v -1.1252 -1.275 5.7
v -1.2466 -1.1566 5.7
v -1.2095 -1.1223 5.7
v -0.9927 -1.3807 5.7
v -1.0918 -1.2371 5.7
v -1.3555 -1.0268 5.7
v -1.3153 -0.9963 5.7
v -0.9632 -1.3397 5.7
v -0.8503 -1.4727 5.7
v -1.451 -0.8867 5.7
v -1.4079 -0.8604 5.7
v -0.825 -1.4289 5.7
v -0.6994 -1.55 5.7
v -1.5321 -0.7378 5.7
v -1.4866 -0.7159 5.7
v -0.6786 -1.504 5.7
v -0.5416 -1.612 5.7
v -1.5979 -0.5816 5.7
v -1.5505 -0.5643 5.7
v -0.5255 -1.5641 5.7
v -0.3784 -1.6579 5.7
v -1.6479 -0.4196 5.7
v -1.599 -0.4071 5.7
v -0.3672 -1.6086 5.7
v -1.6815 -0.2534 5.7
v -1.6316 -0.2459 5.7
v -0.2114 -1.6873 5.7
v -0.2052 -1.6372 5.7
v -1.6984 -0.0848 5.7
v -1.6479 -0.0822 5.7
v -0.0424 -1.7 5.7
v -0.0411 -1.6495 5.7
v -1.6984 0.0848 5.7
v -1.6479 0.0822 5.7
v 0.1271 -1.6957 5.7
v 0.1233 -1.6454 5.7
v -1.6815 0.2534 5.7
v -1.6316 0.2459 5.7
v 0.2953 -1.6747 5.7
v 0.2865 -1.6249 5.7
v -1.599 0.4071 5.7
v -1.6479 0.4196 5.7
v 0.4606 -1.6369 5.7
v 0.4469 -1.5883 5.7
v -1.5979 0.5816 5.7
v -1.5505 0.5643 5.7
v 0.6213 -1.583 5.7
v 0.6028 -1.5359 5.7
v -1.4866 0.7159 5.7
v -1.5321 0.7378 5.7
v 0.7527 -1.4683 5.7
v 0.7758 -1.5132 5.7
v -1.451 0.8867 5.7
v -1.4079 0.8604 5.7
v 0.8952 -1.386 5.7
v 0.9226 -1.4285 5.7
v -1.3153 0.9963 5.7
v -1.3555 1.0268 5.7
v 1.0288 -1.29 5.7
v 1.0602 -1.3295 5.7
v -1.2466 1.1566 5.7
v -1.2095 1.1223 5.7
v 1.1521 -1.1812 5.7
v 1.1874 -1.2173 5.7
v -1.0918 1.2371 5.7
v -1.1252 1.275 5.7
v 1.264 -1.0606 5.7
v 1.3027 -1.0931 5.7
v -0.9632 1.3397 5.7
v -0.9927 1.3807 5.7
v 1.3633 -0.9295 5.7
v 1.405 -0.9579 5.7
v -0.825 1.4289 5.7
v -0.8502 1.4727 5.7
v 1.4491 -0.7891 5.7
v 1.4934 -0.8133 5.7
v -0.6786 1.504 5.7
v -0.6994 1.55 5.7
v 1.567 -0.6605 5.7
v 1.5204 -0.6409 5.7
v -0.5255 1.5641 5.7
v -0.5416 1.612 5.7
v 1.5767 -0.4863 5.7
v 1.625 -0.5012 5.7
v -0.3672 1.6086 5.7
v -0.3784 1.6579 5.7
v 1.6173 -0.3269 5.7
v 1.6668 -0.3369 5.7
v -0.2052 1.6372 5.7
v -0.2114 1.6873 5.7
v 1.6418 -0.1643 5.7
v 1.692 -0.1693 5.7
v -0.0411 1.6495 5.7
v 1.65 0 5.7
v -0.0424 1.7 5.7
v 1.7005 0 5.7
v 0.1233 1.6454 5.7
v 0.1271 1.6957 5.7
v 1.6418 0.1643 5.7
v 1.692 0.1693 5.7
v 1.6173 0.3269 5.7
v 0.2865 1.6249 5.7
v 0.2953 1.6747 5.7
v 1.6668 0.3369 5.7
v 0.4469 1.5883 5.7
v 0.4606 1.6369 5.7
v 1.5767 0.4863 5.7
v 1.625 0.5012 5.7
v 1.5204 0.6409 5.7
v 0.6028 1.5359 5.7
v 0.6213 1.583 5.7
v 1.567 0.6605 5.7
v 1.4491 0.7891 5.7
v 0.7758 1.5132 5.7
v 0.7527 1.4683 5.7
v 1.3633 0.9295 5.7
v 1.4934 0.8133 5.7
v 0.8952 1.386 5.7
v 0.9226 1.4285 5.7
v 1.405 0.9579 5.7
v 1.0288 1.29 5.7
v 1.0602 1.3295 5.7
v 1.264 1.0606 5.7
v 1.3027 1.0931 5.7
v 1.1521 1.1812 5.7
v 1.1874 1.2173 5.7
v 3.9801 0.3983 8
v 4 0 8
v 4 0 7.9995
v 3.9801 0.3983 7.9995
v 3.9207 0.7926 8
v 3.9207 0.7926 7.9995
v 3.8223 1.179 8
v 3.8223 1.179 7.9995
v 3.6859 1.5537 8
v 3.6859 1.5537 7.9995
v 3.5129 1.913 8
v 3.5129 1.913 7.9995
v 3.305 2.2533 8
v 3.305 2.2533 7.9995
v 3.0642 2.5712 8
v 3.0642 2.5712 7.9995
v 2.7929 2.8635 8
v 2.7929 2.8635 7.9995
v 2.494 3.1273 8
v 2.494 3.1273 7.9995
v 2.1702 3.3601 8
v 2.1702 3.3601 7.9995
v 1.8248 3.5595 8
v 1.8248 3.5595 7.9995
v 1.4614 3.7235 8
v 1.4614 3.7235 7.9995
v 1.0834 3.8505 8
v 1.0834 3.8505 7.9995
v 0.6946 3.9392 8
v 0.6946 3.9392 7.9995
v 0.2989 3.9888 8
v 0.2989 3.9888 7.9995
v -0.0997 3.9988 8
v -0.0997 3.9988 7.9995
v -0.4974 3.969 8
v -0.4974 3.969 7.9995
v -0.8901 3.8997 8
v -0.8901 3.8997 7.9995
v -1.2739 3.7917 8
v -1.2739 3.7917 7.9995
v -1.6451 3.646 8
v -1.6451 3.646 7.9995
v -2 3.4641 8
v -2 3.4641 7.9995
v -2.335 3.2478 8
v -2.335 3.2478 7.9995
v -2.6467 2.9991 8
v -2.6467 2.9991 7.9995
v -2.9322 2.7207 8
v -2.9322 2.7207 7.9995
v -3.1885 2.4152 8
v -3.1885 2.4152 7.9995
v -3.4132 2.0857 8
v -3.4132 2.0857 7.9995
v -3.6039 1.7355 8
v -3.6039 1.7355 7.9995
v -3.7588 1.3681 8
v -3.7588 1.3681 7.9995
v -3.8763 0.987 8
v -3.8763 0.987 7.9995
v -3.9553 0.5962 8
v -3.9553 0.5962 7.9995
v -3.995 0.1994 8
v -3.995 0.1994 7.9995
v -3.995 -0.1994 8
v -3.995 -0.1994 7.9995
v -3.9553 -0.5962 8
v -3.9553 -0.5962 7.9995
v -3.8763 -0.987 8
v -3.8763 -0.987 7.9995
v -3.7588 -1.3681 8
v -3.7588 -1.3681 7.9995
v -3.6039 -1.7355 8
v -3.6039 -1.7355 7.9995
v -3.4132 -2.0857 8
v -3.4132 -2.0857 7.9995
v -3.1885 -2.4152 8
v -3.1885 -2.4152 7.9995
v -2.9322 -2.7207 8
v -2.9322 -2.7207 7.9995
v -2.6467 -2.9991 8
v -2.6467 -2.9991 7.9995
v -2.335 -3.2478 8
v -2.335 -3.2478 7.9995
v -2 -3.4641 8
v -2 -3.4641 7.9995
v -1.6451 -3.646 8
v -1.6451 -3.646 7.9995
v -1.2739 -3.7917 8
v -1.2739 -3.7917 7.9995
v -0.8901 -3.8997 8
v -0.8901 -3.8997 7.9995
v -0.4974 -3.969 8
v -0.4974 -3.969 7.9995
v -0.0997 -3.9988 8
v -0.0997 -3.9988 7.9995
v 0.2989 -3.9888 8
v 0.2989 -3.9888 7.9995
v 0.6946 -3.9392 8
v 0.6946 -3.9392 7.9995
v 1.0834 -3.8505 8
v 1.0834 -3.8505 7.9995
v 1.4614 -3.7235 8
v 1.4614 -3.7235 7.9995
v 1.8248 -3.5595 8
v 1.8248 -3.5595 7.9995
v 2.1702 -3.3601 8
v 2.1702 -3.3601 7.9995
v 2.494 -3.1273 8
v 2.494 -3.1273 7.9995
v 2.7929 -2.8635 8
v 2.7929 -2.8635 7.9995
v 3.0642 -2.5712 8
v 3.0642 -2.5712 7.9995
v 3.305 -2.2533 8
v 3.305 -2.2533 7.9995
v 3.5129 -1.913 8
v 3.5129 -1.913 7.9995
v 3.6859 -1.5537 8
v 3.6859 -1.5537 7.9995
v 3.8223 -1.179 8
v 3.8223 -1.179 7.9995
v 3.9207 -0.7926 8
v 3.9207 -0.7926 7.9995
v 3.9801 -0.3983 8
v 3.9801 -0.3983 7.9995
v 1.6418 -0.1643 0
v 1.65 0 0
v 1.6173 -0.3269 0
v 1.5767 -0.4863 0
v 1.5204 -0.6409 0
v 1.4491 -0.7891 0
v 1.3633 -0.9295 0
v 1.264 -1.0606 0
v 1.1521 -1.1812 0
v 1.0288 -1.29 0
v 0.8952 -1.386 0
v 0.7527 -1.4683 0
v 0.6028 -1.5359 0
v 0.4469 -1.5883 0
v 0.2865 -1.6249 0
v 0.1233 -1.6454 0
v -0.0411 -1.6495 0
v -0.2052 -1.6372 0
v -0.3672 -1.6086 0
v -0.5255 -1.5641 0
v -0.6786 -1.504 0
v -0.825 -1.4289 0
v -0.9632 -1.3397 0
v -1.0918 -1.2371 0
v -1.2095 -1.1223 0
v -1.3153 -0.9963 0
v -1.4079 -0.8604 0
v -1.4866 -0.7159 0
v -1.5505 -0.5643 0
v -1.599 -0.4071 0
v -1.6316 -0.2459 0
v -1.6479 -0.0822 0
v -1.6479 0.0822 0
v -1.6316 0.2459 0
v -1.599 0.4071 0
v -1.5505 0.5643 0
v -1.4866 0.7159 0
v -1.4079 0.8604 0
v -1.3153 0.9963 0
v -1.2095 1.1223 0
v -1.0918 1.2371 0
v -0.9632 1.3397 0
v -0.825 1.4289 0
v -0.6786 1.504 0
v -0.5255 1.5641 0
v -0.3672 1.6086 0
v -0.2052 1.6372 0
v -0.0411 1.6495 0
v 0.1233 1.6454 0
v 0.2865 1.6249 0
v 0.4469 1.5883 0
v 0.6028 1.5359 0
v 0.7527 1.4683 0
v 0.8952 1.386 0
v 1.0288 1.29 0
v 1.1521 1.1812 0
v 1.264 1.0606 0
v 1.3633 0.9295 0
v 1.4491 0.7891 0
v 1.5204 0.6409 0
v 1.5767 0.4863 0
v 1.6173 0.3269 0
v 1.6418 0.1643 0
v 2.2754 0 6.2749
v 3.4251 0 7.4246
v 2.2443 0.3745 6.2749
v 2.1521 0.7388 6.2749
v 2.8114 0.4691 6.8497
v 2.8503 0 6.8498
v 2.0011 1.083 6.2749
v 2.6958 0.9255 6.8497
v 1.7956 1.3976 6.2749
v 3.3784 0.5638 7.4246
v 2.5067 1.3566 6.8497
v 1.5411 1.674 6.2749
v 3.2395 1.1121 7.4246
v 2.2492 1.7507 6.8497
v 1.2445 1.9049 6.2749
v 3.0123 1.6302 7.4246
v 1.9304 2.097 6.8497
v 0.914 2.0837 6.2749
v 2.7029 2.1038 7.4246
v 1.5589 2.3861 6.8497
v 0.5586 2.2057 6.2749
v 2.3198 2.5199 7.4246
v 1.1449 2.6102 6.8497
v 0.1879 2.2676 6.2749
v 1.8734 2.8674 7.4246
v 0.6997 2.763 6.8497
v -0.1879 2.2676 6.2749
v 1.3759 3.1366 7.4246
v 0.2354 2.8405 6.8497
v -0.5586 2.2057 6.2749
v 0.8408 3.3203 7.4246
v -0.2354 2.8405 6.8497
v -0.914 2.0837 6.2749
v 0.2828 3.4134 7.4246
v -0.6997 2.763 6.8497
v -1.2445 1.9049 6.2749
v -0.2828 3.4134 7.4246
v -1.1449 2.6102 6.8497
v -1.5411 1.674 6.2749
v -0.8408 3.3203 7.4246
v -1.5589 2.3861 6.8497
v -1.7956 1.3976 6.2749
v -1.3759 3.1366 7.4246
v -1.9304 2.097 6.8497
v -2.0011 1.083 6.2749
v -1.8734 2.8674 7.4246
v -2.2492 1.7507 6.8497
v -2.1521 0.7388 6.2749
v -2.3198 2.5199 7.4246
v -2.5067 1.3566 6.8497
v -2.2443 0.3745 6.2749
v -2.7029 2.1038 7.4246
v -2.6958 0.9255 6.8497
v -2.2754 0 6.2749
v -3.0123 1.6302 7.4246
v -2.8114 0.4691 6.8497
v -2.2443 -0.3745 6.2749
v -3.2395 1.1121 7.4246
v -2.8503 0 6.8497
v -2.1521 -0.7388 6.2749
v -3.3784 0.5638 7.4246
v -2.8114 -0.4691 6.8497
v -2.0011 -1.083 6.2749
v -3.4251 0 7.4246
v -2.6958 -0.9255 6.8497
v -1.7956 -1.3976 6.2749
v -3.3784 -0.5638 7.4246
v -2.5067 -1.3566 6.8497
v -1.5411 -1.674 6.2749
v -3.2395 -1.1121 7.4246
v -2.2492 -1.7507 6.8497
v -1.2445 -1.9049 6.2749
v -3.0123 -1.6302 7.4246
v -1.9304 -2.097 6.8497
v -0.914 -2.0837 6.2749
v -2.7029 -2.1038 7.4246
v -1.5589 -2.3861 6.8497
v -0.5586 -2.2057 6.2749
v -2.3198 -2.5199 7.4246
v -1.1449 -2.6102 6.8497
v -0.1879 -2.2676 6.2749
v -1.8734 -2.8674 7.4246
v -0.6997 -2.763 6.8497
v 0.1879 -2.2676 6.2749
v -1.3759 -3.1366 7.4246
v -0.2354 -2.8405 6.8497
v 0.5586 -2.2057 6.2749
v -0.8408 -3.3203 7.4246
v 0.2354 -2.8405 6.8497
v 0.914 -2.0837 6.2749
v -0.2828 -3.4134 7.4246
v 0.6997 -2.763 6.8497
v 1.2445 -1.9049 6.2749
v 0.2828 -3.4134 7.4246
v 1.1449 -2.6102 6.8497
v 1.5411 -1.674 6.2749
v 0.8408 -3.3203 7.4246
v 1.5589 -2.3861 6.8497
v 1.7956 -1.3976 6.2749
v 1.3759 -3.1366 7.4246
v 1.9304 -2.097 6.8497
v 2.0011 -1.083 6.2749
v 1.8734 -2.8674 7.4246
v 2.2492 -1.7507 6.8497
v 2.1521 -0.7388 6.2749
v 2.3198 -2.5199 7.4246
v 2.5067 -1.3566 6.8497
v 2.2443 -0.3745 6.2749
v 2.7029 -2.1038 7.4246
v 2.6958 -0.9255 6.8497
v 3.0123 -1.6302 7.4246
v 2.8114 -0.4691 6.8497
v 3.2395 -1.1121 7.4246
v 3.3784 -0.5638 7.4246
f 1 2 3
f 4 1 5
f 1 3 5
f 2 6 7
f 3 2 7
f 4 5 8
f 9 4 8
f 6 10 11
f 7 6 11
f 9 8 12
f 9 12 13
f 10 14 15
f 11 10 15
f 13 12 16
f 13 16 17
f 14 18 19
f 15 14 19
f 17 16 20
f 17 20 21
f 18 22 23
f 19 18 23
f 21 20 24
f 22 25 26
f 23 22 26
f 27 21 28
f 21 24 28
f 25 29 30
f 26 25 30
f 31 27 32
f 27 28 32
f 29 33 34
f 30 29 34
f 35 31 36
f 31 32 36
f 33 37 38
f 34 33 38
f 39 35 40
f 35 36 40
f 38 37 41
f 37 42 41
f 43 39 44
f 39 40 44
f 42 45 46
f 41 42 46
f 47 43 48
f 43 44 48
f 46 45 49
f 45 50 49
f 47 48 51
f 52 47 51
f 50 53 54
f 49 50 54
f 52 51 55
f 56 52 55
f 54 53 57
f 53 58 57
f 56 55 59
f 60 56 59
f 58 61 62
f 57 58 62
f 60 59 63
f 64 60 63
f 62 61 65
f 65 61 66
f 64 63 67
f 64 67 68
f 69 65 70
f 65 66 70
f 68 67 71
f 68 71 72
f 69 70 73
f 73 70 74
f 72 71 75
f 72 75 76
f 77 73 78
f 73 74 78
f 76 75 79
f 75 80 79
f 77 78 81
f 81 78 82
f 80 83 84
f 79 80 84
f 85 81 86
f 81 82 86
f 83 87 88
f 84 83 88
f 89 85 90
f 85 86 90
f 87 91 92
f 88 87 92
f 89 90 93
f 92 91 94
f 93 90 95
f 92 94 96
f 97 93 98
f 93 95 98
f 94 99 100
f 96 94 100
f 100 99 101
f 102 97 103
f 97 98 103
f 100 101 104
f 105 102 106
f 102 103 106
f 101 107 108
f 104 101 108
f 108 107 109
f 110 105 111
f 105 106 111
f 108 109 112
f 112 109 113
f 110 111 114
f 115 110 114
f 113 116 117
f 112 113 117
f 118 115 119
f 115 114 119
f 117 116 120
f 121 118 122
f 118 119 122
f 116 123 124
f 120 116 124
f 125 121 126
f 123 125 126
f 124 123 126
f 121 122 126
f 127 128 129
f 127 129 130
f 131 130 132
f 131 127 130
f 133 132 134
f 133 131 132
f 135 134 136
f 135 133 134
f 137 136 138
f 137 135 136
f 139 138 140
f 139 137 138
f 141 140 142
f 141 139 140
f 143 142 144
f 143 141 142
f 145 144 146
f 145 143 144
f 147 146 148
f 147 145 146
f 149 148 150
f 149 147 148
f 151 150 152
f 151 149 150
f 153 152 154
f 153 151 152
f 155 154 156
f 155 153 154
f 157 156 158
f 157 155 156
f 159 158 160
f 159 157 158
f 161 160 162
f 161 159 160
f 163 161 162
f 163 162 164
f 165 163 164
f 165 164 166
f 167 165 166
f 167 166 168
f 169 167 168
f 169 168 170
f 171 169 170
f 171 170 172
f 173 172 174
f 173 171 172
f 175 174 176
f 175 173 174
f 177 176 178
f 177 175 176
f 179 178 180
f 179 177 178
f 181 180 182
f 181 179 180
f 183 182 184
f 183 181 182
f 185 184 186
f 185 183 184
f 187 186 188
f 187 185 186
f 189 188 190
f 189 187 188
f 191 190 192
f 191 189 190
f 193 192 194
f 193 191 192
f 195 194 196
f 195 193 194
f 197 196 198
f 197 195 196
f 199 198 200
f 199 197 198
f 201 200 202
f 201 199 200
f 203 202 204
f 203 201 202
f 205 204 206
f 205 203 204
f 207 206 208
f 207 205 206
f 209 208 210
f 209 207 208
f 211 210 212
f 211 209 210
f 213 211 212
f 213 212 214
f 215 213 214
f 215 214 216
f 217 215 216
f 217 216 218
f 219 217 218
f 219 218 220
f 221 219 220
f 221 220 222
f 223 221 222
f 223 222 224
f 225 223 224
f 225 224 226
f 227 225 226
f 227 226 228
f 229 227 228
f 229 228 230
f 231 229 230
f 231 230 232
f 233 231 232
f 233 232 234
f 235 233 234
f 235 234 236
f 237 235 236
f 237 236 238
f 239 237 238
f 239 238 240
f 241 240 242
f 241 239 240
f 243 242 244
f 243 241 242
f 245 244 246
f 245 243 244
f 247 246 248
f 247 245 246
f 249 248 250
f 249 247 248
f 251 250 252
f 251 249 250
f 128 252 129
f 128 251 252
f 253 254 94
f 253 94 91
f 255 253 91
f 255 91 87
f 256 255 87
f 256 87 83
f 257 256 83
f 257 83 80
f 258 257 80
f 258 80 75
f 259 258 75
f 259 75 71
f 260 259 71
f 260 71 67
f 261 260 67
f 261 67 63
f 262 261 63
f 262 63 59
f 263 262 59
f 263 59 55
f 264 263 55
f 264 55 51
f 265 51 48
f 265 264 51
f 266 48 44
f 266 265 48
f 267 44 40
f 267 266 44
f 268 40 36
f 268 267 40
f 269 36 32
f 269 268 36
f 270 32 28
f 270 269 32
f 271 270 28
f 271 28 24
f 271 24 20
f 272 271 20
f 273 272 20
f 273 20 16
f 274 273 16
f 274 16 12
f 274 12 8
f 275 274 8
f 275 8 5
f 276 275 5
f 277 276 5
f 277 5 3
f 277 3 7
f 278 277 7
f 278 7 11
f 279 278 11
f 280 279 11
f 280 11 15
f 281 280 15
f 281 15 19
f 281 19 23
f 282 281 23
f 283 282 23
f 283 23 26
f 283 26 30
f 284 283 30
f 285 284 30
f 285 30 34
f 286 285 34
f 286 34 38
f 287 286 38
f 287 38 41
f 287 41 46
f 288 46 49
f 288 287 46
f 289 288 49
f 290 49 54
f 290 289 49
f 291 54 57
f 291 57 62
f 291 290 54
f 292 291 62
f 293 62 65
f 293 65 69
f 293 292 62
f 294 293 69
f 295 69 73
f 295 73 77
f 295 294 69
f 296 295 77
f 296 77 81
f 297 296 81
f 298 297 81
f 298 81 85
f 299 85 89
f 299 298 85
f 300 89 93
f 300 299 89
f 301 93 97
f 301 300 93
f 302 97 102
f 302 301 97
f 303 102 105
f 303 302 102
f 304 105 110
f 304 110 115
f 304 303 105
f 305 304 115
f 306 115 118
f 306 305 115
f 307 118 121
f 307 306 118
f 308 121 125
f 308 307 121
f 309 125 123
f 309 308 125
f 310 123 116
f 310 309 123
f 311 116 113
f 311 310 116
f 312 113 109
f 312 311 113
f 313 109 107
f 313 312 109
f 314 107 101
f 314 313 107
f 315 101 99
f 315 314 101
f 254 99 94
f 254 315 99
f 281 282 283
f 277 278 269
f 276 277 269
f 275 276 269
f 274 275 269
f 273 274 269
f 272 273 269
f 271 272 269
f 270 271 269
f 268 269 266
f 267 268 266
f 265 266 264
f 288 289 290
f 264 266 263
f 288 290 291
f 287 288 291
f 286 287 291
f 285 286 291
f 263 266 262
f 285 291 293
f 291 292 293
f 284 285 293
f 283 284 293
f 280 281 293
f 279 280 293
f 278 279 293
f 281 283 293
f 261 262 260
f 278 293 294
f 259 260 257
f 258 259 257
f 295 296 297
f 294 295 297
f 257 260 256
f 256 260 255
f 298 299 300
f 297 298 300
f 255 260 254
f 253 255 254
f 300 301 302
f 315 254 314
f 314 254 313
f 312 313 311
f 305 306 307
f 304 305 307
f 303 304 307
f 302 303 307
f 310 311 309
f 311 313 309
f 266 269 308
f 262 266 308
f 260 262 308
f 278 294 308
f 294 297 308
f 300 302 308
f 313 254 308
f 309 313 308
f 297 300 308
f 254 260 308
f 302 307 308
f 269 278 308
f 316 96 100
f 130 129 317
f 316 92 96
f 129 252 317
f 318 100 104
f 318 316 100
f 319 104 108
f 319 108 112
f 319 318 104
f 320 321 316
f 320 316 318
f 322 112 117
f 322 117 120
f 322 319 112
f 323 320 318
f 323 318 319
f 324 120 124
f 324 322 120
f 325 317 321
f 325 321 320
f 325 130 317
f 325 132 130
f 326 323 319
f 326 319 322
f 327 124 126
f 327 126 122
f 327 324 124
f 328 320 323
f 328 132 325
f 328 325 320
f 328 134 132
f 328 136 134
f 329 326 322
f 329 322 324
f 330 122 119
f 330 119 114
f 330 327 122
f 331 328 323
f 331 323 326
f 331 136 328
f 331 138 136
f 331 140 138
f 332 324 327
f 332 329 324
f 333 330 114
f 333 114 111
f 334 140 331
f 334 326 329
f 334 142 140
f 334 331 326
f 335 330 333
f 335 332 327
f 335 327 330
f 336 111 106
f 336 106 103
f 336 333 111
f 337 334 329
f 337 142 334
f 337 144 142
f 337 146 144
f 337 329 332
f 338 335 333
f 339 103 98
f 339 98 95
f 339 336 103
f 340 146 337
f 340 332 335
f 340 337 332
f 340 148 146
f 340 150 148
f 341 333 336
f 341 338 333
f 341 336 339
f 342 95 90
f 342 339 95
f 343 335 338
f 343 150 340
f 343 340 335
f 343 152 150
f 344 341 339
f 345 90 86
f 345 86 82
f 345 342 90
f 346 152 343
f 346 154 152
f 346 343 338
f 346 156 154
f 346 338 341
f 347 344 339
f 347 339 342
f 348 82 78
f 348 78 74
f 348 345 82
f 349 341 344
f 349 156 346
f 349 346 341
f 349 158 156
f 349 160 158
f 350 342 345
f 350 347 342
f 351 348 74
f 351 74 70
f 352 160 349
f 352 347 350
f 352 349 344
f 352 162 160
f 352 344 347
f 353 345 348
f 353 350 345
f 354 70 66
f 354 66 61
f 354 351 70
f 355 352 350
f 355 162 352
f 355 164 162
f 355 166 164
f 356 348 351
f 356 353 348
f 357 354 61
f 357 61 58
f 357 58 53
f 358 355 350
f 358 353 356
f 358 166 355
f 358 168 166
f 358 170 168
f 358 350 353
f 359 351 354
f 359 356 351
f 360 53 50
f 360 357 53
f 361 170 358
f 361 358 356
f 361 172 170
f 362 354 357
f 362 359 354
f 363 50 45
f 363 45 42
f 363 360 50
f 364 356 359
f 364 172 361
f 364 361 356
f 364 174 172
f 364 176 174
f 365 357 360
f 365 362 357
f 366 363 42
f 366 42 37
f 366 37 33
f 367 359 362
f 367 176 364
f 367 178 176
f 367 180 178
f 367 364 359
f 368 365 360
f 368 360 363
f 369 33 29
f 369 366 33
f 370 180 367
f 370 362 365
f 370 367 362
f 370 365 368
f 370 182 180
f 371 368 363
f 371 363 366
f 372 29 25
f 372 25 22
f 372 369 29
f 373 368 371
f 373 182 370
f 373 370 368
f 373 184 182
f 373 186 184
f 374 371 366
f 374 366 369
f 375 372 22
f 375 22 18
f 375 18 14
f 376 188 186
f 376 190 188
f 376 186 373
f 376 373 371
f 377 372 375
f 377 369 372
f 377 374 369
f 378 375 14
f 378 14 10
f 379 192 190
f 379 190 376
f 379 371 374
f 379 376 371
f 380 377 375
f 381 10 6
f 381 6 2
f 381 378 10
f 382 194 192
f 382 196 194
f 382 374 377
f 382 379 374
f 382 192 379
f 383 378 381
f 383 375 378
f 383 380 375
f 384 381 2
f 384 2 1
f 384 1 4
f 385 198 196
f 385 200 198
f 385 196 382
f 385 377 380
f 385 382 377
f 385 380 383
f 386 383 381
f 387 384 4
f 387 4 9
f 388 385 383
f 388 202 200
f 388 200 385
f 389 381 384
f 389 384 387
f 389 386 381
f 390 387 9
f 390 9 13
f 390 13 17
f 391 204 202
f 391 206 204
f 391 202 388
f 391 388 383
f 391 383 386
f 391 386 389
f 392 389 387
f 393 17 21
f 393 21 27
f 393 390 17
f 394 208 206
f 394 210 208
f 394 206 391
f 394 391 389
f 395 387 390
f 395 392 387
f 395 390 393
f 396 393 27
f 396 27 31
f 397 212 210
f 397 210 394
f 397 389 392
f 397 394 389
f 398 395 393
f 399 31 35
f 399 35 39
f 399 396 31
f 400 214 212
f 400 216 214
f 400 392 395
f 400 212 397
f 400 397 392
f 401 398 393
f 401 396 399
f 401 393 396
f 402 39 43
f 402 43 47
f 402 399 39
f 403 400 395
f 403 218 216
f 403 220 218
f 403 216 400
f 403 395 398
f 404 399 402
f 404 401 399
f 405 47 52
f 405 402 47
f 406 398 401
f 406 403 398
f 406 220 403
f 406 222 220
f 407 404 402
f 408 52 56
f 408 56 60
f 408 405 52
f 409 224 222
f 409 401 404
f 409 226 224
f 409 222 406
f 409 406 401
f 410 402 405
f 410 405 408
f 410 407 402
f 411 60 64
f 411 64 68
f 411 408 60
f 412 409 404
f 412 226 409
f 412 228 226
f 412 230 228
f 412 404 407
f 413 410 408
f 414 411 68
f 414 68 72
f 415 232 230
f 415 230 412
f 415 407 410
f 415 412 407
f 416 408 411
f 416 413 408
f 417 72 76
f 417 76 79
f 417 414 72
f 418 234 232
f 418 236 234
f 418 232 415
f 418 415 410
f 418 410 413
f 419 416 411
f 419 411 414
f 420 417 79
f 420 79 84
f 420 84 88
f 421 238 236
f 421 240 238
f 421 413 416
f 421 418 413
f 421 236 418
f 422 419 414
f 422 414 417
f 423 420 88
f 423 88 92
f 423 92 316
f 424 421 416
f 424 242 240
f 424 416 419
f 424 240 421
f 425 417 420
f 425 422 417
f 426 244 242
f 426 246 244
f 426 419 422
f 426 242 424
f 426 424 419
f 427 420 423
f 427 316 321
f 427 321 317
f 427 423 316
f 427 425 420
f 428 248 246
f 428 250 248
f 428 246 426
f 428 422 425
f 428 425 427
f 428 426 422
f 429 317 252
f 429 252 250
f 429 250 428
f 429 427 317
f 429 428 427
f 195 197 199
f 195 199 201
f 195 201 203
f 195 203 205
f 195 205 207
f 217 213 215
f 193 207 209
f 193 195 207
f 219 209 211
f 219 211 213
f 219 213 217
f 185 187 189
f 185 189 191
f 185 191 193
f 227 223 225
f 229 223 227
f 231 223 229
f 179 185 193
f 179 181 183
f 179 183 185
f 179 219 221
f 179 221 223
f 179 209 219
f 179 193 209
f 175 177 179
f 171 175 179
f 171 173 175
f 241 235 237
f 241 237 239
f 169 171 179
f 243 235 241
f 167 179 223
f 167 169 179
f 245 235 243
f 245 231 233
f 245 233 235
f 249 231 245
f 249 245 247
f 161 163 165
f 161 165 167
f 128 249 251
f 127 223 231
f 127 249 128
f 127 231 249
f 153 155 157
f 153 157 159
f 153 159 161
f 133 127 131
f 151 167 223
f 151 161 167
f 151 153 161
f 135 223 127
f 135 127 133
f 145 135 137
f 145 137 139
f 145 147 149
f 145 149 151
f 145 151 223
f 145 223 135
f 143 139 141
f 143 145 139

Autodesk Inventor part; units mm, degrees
ref_plane "YZ Plane" through (0, 0, 0) normal (1, 0, 0) x (0, 1, 0)
ref_plane "XZ Plane" through (0, 0, 0) normal (0, 1, 0) x (-1, 0, 0)
ref_plane "XY Plane" through (0, 0, 0) normal (0, 0, 1) x (1, 0, 0)
sketch "スケッチ1" plane through (0, 0, 0) normal (0, 0, 1) x (1, 0, 0)
  circle A0 centre (0, 0) radius 1.65
  dimension "d0" = 3.3
extrude "押し出し1" add sketch "スケッチ1" along normal blind 8
sketch "スケッチ2" plane through (0, 0, 8) normal (0, 0, 1) x (1, 0, 0)
  circle A0 centre (0, 0) radius 4
  dimension "d3" = 8
extrude "押し出し2" add sketch "スケッチ2" against normal blind 2.3
chamfer "面取り1" distance 2.3 angle 45 1 edges at (-4, 0, 5.7)
thread "ねじ1" size "M3.5x0.6" class "6g" standard "ANSI Metric M Profile" full length
properties part number "ネジ皿m4,08" material "鋼、高強度、低合金"
